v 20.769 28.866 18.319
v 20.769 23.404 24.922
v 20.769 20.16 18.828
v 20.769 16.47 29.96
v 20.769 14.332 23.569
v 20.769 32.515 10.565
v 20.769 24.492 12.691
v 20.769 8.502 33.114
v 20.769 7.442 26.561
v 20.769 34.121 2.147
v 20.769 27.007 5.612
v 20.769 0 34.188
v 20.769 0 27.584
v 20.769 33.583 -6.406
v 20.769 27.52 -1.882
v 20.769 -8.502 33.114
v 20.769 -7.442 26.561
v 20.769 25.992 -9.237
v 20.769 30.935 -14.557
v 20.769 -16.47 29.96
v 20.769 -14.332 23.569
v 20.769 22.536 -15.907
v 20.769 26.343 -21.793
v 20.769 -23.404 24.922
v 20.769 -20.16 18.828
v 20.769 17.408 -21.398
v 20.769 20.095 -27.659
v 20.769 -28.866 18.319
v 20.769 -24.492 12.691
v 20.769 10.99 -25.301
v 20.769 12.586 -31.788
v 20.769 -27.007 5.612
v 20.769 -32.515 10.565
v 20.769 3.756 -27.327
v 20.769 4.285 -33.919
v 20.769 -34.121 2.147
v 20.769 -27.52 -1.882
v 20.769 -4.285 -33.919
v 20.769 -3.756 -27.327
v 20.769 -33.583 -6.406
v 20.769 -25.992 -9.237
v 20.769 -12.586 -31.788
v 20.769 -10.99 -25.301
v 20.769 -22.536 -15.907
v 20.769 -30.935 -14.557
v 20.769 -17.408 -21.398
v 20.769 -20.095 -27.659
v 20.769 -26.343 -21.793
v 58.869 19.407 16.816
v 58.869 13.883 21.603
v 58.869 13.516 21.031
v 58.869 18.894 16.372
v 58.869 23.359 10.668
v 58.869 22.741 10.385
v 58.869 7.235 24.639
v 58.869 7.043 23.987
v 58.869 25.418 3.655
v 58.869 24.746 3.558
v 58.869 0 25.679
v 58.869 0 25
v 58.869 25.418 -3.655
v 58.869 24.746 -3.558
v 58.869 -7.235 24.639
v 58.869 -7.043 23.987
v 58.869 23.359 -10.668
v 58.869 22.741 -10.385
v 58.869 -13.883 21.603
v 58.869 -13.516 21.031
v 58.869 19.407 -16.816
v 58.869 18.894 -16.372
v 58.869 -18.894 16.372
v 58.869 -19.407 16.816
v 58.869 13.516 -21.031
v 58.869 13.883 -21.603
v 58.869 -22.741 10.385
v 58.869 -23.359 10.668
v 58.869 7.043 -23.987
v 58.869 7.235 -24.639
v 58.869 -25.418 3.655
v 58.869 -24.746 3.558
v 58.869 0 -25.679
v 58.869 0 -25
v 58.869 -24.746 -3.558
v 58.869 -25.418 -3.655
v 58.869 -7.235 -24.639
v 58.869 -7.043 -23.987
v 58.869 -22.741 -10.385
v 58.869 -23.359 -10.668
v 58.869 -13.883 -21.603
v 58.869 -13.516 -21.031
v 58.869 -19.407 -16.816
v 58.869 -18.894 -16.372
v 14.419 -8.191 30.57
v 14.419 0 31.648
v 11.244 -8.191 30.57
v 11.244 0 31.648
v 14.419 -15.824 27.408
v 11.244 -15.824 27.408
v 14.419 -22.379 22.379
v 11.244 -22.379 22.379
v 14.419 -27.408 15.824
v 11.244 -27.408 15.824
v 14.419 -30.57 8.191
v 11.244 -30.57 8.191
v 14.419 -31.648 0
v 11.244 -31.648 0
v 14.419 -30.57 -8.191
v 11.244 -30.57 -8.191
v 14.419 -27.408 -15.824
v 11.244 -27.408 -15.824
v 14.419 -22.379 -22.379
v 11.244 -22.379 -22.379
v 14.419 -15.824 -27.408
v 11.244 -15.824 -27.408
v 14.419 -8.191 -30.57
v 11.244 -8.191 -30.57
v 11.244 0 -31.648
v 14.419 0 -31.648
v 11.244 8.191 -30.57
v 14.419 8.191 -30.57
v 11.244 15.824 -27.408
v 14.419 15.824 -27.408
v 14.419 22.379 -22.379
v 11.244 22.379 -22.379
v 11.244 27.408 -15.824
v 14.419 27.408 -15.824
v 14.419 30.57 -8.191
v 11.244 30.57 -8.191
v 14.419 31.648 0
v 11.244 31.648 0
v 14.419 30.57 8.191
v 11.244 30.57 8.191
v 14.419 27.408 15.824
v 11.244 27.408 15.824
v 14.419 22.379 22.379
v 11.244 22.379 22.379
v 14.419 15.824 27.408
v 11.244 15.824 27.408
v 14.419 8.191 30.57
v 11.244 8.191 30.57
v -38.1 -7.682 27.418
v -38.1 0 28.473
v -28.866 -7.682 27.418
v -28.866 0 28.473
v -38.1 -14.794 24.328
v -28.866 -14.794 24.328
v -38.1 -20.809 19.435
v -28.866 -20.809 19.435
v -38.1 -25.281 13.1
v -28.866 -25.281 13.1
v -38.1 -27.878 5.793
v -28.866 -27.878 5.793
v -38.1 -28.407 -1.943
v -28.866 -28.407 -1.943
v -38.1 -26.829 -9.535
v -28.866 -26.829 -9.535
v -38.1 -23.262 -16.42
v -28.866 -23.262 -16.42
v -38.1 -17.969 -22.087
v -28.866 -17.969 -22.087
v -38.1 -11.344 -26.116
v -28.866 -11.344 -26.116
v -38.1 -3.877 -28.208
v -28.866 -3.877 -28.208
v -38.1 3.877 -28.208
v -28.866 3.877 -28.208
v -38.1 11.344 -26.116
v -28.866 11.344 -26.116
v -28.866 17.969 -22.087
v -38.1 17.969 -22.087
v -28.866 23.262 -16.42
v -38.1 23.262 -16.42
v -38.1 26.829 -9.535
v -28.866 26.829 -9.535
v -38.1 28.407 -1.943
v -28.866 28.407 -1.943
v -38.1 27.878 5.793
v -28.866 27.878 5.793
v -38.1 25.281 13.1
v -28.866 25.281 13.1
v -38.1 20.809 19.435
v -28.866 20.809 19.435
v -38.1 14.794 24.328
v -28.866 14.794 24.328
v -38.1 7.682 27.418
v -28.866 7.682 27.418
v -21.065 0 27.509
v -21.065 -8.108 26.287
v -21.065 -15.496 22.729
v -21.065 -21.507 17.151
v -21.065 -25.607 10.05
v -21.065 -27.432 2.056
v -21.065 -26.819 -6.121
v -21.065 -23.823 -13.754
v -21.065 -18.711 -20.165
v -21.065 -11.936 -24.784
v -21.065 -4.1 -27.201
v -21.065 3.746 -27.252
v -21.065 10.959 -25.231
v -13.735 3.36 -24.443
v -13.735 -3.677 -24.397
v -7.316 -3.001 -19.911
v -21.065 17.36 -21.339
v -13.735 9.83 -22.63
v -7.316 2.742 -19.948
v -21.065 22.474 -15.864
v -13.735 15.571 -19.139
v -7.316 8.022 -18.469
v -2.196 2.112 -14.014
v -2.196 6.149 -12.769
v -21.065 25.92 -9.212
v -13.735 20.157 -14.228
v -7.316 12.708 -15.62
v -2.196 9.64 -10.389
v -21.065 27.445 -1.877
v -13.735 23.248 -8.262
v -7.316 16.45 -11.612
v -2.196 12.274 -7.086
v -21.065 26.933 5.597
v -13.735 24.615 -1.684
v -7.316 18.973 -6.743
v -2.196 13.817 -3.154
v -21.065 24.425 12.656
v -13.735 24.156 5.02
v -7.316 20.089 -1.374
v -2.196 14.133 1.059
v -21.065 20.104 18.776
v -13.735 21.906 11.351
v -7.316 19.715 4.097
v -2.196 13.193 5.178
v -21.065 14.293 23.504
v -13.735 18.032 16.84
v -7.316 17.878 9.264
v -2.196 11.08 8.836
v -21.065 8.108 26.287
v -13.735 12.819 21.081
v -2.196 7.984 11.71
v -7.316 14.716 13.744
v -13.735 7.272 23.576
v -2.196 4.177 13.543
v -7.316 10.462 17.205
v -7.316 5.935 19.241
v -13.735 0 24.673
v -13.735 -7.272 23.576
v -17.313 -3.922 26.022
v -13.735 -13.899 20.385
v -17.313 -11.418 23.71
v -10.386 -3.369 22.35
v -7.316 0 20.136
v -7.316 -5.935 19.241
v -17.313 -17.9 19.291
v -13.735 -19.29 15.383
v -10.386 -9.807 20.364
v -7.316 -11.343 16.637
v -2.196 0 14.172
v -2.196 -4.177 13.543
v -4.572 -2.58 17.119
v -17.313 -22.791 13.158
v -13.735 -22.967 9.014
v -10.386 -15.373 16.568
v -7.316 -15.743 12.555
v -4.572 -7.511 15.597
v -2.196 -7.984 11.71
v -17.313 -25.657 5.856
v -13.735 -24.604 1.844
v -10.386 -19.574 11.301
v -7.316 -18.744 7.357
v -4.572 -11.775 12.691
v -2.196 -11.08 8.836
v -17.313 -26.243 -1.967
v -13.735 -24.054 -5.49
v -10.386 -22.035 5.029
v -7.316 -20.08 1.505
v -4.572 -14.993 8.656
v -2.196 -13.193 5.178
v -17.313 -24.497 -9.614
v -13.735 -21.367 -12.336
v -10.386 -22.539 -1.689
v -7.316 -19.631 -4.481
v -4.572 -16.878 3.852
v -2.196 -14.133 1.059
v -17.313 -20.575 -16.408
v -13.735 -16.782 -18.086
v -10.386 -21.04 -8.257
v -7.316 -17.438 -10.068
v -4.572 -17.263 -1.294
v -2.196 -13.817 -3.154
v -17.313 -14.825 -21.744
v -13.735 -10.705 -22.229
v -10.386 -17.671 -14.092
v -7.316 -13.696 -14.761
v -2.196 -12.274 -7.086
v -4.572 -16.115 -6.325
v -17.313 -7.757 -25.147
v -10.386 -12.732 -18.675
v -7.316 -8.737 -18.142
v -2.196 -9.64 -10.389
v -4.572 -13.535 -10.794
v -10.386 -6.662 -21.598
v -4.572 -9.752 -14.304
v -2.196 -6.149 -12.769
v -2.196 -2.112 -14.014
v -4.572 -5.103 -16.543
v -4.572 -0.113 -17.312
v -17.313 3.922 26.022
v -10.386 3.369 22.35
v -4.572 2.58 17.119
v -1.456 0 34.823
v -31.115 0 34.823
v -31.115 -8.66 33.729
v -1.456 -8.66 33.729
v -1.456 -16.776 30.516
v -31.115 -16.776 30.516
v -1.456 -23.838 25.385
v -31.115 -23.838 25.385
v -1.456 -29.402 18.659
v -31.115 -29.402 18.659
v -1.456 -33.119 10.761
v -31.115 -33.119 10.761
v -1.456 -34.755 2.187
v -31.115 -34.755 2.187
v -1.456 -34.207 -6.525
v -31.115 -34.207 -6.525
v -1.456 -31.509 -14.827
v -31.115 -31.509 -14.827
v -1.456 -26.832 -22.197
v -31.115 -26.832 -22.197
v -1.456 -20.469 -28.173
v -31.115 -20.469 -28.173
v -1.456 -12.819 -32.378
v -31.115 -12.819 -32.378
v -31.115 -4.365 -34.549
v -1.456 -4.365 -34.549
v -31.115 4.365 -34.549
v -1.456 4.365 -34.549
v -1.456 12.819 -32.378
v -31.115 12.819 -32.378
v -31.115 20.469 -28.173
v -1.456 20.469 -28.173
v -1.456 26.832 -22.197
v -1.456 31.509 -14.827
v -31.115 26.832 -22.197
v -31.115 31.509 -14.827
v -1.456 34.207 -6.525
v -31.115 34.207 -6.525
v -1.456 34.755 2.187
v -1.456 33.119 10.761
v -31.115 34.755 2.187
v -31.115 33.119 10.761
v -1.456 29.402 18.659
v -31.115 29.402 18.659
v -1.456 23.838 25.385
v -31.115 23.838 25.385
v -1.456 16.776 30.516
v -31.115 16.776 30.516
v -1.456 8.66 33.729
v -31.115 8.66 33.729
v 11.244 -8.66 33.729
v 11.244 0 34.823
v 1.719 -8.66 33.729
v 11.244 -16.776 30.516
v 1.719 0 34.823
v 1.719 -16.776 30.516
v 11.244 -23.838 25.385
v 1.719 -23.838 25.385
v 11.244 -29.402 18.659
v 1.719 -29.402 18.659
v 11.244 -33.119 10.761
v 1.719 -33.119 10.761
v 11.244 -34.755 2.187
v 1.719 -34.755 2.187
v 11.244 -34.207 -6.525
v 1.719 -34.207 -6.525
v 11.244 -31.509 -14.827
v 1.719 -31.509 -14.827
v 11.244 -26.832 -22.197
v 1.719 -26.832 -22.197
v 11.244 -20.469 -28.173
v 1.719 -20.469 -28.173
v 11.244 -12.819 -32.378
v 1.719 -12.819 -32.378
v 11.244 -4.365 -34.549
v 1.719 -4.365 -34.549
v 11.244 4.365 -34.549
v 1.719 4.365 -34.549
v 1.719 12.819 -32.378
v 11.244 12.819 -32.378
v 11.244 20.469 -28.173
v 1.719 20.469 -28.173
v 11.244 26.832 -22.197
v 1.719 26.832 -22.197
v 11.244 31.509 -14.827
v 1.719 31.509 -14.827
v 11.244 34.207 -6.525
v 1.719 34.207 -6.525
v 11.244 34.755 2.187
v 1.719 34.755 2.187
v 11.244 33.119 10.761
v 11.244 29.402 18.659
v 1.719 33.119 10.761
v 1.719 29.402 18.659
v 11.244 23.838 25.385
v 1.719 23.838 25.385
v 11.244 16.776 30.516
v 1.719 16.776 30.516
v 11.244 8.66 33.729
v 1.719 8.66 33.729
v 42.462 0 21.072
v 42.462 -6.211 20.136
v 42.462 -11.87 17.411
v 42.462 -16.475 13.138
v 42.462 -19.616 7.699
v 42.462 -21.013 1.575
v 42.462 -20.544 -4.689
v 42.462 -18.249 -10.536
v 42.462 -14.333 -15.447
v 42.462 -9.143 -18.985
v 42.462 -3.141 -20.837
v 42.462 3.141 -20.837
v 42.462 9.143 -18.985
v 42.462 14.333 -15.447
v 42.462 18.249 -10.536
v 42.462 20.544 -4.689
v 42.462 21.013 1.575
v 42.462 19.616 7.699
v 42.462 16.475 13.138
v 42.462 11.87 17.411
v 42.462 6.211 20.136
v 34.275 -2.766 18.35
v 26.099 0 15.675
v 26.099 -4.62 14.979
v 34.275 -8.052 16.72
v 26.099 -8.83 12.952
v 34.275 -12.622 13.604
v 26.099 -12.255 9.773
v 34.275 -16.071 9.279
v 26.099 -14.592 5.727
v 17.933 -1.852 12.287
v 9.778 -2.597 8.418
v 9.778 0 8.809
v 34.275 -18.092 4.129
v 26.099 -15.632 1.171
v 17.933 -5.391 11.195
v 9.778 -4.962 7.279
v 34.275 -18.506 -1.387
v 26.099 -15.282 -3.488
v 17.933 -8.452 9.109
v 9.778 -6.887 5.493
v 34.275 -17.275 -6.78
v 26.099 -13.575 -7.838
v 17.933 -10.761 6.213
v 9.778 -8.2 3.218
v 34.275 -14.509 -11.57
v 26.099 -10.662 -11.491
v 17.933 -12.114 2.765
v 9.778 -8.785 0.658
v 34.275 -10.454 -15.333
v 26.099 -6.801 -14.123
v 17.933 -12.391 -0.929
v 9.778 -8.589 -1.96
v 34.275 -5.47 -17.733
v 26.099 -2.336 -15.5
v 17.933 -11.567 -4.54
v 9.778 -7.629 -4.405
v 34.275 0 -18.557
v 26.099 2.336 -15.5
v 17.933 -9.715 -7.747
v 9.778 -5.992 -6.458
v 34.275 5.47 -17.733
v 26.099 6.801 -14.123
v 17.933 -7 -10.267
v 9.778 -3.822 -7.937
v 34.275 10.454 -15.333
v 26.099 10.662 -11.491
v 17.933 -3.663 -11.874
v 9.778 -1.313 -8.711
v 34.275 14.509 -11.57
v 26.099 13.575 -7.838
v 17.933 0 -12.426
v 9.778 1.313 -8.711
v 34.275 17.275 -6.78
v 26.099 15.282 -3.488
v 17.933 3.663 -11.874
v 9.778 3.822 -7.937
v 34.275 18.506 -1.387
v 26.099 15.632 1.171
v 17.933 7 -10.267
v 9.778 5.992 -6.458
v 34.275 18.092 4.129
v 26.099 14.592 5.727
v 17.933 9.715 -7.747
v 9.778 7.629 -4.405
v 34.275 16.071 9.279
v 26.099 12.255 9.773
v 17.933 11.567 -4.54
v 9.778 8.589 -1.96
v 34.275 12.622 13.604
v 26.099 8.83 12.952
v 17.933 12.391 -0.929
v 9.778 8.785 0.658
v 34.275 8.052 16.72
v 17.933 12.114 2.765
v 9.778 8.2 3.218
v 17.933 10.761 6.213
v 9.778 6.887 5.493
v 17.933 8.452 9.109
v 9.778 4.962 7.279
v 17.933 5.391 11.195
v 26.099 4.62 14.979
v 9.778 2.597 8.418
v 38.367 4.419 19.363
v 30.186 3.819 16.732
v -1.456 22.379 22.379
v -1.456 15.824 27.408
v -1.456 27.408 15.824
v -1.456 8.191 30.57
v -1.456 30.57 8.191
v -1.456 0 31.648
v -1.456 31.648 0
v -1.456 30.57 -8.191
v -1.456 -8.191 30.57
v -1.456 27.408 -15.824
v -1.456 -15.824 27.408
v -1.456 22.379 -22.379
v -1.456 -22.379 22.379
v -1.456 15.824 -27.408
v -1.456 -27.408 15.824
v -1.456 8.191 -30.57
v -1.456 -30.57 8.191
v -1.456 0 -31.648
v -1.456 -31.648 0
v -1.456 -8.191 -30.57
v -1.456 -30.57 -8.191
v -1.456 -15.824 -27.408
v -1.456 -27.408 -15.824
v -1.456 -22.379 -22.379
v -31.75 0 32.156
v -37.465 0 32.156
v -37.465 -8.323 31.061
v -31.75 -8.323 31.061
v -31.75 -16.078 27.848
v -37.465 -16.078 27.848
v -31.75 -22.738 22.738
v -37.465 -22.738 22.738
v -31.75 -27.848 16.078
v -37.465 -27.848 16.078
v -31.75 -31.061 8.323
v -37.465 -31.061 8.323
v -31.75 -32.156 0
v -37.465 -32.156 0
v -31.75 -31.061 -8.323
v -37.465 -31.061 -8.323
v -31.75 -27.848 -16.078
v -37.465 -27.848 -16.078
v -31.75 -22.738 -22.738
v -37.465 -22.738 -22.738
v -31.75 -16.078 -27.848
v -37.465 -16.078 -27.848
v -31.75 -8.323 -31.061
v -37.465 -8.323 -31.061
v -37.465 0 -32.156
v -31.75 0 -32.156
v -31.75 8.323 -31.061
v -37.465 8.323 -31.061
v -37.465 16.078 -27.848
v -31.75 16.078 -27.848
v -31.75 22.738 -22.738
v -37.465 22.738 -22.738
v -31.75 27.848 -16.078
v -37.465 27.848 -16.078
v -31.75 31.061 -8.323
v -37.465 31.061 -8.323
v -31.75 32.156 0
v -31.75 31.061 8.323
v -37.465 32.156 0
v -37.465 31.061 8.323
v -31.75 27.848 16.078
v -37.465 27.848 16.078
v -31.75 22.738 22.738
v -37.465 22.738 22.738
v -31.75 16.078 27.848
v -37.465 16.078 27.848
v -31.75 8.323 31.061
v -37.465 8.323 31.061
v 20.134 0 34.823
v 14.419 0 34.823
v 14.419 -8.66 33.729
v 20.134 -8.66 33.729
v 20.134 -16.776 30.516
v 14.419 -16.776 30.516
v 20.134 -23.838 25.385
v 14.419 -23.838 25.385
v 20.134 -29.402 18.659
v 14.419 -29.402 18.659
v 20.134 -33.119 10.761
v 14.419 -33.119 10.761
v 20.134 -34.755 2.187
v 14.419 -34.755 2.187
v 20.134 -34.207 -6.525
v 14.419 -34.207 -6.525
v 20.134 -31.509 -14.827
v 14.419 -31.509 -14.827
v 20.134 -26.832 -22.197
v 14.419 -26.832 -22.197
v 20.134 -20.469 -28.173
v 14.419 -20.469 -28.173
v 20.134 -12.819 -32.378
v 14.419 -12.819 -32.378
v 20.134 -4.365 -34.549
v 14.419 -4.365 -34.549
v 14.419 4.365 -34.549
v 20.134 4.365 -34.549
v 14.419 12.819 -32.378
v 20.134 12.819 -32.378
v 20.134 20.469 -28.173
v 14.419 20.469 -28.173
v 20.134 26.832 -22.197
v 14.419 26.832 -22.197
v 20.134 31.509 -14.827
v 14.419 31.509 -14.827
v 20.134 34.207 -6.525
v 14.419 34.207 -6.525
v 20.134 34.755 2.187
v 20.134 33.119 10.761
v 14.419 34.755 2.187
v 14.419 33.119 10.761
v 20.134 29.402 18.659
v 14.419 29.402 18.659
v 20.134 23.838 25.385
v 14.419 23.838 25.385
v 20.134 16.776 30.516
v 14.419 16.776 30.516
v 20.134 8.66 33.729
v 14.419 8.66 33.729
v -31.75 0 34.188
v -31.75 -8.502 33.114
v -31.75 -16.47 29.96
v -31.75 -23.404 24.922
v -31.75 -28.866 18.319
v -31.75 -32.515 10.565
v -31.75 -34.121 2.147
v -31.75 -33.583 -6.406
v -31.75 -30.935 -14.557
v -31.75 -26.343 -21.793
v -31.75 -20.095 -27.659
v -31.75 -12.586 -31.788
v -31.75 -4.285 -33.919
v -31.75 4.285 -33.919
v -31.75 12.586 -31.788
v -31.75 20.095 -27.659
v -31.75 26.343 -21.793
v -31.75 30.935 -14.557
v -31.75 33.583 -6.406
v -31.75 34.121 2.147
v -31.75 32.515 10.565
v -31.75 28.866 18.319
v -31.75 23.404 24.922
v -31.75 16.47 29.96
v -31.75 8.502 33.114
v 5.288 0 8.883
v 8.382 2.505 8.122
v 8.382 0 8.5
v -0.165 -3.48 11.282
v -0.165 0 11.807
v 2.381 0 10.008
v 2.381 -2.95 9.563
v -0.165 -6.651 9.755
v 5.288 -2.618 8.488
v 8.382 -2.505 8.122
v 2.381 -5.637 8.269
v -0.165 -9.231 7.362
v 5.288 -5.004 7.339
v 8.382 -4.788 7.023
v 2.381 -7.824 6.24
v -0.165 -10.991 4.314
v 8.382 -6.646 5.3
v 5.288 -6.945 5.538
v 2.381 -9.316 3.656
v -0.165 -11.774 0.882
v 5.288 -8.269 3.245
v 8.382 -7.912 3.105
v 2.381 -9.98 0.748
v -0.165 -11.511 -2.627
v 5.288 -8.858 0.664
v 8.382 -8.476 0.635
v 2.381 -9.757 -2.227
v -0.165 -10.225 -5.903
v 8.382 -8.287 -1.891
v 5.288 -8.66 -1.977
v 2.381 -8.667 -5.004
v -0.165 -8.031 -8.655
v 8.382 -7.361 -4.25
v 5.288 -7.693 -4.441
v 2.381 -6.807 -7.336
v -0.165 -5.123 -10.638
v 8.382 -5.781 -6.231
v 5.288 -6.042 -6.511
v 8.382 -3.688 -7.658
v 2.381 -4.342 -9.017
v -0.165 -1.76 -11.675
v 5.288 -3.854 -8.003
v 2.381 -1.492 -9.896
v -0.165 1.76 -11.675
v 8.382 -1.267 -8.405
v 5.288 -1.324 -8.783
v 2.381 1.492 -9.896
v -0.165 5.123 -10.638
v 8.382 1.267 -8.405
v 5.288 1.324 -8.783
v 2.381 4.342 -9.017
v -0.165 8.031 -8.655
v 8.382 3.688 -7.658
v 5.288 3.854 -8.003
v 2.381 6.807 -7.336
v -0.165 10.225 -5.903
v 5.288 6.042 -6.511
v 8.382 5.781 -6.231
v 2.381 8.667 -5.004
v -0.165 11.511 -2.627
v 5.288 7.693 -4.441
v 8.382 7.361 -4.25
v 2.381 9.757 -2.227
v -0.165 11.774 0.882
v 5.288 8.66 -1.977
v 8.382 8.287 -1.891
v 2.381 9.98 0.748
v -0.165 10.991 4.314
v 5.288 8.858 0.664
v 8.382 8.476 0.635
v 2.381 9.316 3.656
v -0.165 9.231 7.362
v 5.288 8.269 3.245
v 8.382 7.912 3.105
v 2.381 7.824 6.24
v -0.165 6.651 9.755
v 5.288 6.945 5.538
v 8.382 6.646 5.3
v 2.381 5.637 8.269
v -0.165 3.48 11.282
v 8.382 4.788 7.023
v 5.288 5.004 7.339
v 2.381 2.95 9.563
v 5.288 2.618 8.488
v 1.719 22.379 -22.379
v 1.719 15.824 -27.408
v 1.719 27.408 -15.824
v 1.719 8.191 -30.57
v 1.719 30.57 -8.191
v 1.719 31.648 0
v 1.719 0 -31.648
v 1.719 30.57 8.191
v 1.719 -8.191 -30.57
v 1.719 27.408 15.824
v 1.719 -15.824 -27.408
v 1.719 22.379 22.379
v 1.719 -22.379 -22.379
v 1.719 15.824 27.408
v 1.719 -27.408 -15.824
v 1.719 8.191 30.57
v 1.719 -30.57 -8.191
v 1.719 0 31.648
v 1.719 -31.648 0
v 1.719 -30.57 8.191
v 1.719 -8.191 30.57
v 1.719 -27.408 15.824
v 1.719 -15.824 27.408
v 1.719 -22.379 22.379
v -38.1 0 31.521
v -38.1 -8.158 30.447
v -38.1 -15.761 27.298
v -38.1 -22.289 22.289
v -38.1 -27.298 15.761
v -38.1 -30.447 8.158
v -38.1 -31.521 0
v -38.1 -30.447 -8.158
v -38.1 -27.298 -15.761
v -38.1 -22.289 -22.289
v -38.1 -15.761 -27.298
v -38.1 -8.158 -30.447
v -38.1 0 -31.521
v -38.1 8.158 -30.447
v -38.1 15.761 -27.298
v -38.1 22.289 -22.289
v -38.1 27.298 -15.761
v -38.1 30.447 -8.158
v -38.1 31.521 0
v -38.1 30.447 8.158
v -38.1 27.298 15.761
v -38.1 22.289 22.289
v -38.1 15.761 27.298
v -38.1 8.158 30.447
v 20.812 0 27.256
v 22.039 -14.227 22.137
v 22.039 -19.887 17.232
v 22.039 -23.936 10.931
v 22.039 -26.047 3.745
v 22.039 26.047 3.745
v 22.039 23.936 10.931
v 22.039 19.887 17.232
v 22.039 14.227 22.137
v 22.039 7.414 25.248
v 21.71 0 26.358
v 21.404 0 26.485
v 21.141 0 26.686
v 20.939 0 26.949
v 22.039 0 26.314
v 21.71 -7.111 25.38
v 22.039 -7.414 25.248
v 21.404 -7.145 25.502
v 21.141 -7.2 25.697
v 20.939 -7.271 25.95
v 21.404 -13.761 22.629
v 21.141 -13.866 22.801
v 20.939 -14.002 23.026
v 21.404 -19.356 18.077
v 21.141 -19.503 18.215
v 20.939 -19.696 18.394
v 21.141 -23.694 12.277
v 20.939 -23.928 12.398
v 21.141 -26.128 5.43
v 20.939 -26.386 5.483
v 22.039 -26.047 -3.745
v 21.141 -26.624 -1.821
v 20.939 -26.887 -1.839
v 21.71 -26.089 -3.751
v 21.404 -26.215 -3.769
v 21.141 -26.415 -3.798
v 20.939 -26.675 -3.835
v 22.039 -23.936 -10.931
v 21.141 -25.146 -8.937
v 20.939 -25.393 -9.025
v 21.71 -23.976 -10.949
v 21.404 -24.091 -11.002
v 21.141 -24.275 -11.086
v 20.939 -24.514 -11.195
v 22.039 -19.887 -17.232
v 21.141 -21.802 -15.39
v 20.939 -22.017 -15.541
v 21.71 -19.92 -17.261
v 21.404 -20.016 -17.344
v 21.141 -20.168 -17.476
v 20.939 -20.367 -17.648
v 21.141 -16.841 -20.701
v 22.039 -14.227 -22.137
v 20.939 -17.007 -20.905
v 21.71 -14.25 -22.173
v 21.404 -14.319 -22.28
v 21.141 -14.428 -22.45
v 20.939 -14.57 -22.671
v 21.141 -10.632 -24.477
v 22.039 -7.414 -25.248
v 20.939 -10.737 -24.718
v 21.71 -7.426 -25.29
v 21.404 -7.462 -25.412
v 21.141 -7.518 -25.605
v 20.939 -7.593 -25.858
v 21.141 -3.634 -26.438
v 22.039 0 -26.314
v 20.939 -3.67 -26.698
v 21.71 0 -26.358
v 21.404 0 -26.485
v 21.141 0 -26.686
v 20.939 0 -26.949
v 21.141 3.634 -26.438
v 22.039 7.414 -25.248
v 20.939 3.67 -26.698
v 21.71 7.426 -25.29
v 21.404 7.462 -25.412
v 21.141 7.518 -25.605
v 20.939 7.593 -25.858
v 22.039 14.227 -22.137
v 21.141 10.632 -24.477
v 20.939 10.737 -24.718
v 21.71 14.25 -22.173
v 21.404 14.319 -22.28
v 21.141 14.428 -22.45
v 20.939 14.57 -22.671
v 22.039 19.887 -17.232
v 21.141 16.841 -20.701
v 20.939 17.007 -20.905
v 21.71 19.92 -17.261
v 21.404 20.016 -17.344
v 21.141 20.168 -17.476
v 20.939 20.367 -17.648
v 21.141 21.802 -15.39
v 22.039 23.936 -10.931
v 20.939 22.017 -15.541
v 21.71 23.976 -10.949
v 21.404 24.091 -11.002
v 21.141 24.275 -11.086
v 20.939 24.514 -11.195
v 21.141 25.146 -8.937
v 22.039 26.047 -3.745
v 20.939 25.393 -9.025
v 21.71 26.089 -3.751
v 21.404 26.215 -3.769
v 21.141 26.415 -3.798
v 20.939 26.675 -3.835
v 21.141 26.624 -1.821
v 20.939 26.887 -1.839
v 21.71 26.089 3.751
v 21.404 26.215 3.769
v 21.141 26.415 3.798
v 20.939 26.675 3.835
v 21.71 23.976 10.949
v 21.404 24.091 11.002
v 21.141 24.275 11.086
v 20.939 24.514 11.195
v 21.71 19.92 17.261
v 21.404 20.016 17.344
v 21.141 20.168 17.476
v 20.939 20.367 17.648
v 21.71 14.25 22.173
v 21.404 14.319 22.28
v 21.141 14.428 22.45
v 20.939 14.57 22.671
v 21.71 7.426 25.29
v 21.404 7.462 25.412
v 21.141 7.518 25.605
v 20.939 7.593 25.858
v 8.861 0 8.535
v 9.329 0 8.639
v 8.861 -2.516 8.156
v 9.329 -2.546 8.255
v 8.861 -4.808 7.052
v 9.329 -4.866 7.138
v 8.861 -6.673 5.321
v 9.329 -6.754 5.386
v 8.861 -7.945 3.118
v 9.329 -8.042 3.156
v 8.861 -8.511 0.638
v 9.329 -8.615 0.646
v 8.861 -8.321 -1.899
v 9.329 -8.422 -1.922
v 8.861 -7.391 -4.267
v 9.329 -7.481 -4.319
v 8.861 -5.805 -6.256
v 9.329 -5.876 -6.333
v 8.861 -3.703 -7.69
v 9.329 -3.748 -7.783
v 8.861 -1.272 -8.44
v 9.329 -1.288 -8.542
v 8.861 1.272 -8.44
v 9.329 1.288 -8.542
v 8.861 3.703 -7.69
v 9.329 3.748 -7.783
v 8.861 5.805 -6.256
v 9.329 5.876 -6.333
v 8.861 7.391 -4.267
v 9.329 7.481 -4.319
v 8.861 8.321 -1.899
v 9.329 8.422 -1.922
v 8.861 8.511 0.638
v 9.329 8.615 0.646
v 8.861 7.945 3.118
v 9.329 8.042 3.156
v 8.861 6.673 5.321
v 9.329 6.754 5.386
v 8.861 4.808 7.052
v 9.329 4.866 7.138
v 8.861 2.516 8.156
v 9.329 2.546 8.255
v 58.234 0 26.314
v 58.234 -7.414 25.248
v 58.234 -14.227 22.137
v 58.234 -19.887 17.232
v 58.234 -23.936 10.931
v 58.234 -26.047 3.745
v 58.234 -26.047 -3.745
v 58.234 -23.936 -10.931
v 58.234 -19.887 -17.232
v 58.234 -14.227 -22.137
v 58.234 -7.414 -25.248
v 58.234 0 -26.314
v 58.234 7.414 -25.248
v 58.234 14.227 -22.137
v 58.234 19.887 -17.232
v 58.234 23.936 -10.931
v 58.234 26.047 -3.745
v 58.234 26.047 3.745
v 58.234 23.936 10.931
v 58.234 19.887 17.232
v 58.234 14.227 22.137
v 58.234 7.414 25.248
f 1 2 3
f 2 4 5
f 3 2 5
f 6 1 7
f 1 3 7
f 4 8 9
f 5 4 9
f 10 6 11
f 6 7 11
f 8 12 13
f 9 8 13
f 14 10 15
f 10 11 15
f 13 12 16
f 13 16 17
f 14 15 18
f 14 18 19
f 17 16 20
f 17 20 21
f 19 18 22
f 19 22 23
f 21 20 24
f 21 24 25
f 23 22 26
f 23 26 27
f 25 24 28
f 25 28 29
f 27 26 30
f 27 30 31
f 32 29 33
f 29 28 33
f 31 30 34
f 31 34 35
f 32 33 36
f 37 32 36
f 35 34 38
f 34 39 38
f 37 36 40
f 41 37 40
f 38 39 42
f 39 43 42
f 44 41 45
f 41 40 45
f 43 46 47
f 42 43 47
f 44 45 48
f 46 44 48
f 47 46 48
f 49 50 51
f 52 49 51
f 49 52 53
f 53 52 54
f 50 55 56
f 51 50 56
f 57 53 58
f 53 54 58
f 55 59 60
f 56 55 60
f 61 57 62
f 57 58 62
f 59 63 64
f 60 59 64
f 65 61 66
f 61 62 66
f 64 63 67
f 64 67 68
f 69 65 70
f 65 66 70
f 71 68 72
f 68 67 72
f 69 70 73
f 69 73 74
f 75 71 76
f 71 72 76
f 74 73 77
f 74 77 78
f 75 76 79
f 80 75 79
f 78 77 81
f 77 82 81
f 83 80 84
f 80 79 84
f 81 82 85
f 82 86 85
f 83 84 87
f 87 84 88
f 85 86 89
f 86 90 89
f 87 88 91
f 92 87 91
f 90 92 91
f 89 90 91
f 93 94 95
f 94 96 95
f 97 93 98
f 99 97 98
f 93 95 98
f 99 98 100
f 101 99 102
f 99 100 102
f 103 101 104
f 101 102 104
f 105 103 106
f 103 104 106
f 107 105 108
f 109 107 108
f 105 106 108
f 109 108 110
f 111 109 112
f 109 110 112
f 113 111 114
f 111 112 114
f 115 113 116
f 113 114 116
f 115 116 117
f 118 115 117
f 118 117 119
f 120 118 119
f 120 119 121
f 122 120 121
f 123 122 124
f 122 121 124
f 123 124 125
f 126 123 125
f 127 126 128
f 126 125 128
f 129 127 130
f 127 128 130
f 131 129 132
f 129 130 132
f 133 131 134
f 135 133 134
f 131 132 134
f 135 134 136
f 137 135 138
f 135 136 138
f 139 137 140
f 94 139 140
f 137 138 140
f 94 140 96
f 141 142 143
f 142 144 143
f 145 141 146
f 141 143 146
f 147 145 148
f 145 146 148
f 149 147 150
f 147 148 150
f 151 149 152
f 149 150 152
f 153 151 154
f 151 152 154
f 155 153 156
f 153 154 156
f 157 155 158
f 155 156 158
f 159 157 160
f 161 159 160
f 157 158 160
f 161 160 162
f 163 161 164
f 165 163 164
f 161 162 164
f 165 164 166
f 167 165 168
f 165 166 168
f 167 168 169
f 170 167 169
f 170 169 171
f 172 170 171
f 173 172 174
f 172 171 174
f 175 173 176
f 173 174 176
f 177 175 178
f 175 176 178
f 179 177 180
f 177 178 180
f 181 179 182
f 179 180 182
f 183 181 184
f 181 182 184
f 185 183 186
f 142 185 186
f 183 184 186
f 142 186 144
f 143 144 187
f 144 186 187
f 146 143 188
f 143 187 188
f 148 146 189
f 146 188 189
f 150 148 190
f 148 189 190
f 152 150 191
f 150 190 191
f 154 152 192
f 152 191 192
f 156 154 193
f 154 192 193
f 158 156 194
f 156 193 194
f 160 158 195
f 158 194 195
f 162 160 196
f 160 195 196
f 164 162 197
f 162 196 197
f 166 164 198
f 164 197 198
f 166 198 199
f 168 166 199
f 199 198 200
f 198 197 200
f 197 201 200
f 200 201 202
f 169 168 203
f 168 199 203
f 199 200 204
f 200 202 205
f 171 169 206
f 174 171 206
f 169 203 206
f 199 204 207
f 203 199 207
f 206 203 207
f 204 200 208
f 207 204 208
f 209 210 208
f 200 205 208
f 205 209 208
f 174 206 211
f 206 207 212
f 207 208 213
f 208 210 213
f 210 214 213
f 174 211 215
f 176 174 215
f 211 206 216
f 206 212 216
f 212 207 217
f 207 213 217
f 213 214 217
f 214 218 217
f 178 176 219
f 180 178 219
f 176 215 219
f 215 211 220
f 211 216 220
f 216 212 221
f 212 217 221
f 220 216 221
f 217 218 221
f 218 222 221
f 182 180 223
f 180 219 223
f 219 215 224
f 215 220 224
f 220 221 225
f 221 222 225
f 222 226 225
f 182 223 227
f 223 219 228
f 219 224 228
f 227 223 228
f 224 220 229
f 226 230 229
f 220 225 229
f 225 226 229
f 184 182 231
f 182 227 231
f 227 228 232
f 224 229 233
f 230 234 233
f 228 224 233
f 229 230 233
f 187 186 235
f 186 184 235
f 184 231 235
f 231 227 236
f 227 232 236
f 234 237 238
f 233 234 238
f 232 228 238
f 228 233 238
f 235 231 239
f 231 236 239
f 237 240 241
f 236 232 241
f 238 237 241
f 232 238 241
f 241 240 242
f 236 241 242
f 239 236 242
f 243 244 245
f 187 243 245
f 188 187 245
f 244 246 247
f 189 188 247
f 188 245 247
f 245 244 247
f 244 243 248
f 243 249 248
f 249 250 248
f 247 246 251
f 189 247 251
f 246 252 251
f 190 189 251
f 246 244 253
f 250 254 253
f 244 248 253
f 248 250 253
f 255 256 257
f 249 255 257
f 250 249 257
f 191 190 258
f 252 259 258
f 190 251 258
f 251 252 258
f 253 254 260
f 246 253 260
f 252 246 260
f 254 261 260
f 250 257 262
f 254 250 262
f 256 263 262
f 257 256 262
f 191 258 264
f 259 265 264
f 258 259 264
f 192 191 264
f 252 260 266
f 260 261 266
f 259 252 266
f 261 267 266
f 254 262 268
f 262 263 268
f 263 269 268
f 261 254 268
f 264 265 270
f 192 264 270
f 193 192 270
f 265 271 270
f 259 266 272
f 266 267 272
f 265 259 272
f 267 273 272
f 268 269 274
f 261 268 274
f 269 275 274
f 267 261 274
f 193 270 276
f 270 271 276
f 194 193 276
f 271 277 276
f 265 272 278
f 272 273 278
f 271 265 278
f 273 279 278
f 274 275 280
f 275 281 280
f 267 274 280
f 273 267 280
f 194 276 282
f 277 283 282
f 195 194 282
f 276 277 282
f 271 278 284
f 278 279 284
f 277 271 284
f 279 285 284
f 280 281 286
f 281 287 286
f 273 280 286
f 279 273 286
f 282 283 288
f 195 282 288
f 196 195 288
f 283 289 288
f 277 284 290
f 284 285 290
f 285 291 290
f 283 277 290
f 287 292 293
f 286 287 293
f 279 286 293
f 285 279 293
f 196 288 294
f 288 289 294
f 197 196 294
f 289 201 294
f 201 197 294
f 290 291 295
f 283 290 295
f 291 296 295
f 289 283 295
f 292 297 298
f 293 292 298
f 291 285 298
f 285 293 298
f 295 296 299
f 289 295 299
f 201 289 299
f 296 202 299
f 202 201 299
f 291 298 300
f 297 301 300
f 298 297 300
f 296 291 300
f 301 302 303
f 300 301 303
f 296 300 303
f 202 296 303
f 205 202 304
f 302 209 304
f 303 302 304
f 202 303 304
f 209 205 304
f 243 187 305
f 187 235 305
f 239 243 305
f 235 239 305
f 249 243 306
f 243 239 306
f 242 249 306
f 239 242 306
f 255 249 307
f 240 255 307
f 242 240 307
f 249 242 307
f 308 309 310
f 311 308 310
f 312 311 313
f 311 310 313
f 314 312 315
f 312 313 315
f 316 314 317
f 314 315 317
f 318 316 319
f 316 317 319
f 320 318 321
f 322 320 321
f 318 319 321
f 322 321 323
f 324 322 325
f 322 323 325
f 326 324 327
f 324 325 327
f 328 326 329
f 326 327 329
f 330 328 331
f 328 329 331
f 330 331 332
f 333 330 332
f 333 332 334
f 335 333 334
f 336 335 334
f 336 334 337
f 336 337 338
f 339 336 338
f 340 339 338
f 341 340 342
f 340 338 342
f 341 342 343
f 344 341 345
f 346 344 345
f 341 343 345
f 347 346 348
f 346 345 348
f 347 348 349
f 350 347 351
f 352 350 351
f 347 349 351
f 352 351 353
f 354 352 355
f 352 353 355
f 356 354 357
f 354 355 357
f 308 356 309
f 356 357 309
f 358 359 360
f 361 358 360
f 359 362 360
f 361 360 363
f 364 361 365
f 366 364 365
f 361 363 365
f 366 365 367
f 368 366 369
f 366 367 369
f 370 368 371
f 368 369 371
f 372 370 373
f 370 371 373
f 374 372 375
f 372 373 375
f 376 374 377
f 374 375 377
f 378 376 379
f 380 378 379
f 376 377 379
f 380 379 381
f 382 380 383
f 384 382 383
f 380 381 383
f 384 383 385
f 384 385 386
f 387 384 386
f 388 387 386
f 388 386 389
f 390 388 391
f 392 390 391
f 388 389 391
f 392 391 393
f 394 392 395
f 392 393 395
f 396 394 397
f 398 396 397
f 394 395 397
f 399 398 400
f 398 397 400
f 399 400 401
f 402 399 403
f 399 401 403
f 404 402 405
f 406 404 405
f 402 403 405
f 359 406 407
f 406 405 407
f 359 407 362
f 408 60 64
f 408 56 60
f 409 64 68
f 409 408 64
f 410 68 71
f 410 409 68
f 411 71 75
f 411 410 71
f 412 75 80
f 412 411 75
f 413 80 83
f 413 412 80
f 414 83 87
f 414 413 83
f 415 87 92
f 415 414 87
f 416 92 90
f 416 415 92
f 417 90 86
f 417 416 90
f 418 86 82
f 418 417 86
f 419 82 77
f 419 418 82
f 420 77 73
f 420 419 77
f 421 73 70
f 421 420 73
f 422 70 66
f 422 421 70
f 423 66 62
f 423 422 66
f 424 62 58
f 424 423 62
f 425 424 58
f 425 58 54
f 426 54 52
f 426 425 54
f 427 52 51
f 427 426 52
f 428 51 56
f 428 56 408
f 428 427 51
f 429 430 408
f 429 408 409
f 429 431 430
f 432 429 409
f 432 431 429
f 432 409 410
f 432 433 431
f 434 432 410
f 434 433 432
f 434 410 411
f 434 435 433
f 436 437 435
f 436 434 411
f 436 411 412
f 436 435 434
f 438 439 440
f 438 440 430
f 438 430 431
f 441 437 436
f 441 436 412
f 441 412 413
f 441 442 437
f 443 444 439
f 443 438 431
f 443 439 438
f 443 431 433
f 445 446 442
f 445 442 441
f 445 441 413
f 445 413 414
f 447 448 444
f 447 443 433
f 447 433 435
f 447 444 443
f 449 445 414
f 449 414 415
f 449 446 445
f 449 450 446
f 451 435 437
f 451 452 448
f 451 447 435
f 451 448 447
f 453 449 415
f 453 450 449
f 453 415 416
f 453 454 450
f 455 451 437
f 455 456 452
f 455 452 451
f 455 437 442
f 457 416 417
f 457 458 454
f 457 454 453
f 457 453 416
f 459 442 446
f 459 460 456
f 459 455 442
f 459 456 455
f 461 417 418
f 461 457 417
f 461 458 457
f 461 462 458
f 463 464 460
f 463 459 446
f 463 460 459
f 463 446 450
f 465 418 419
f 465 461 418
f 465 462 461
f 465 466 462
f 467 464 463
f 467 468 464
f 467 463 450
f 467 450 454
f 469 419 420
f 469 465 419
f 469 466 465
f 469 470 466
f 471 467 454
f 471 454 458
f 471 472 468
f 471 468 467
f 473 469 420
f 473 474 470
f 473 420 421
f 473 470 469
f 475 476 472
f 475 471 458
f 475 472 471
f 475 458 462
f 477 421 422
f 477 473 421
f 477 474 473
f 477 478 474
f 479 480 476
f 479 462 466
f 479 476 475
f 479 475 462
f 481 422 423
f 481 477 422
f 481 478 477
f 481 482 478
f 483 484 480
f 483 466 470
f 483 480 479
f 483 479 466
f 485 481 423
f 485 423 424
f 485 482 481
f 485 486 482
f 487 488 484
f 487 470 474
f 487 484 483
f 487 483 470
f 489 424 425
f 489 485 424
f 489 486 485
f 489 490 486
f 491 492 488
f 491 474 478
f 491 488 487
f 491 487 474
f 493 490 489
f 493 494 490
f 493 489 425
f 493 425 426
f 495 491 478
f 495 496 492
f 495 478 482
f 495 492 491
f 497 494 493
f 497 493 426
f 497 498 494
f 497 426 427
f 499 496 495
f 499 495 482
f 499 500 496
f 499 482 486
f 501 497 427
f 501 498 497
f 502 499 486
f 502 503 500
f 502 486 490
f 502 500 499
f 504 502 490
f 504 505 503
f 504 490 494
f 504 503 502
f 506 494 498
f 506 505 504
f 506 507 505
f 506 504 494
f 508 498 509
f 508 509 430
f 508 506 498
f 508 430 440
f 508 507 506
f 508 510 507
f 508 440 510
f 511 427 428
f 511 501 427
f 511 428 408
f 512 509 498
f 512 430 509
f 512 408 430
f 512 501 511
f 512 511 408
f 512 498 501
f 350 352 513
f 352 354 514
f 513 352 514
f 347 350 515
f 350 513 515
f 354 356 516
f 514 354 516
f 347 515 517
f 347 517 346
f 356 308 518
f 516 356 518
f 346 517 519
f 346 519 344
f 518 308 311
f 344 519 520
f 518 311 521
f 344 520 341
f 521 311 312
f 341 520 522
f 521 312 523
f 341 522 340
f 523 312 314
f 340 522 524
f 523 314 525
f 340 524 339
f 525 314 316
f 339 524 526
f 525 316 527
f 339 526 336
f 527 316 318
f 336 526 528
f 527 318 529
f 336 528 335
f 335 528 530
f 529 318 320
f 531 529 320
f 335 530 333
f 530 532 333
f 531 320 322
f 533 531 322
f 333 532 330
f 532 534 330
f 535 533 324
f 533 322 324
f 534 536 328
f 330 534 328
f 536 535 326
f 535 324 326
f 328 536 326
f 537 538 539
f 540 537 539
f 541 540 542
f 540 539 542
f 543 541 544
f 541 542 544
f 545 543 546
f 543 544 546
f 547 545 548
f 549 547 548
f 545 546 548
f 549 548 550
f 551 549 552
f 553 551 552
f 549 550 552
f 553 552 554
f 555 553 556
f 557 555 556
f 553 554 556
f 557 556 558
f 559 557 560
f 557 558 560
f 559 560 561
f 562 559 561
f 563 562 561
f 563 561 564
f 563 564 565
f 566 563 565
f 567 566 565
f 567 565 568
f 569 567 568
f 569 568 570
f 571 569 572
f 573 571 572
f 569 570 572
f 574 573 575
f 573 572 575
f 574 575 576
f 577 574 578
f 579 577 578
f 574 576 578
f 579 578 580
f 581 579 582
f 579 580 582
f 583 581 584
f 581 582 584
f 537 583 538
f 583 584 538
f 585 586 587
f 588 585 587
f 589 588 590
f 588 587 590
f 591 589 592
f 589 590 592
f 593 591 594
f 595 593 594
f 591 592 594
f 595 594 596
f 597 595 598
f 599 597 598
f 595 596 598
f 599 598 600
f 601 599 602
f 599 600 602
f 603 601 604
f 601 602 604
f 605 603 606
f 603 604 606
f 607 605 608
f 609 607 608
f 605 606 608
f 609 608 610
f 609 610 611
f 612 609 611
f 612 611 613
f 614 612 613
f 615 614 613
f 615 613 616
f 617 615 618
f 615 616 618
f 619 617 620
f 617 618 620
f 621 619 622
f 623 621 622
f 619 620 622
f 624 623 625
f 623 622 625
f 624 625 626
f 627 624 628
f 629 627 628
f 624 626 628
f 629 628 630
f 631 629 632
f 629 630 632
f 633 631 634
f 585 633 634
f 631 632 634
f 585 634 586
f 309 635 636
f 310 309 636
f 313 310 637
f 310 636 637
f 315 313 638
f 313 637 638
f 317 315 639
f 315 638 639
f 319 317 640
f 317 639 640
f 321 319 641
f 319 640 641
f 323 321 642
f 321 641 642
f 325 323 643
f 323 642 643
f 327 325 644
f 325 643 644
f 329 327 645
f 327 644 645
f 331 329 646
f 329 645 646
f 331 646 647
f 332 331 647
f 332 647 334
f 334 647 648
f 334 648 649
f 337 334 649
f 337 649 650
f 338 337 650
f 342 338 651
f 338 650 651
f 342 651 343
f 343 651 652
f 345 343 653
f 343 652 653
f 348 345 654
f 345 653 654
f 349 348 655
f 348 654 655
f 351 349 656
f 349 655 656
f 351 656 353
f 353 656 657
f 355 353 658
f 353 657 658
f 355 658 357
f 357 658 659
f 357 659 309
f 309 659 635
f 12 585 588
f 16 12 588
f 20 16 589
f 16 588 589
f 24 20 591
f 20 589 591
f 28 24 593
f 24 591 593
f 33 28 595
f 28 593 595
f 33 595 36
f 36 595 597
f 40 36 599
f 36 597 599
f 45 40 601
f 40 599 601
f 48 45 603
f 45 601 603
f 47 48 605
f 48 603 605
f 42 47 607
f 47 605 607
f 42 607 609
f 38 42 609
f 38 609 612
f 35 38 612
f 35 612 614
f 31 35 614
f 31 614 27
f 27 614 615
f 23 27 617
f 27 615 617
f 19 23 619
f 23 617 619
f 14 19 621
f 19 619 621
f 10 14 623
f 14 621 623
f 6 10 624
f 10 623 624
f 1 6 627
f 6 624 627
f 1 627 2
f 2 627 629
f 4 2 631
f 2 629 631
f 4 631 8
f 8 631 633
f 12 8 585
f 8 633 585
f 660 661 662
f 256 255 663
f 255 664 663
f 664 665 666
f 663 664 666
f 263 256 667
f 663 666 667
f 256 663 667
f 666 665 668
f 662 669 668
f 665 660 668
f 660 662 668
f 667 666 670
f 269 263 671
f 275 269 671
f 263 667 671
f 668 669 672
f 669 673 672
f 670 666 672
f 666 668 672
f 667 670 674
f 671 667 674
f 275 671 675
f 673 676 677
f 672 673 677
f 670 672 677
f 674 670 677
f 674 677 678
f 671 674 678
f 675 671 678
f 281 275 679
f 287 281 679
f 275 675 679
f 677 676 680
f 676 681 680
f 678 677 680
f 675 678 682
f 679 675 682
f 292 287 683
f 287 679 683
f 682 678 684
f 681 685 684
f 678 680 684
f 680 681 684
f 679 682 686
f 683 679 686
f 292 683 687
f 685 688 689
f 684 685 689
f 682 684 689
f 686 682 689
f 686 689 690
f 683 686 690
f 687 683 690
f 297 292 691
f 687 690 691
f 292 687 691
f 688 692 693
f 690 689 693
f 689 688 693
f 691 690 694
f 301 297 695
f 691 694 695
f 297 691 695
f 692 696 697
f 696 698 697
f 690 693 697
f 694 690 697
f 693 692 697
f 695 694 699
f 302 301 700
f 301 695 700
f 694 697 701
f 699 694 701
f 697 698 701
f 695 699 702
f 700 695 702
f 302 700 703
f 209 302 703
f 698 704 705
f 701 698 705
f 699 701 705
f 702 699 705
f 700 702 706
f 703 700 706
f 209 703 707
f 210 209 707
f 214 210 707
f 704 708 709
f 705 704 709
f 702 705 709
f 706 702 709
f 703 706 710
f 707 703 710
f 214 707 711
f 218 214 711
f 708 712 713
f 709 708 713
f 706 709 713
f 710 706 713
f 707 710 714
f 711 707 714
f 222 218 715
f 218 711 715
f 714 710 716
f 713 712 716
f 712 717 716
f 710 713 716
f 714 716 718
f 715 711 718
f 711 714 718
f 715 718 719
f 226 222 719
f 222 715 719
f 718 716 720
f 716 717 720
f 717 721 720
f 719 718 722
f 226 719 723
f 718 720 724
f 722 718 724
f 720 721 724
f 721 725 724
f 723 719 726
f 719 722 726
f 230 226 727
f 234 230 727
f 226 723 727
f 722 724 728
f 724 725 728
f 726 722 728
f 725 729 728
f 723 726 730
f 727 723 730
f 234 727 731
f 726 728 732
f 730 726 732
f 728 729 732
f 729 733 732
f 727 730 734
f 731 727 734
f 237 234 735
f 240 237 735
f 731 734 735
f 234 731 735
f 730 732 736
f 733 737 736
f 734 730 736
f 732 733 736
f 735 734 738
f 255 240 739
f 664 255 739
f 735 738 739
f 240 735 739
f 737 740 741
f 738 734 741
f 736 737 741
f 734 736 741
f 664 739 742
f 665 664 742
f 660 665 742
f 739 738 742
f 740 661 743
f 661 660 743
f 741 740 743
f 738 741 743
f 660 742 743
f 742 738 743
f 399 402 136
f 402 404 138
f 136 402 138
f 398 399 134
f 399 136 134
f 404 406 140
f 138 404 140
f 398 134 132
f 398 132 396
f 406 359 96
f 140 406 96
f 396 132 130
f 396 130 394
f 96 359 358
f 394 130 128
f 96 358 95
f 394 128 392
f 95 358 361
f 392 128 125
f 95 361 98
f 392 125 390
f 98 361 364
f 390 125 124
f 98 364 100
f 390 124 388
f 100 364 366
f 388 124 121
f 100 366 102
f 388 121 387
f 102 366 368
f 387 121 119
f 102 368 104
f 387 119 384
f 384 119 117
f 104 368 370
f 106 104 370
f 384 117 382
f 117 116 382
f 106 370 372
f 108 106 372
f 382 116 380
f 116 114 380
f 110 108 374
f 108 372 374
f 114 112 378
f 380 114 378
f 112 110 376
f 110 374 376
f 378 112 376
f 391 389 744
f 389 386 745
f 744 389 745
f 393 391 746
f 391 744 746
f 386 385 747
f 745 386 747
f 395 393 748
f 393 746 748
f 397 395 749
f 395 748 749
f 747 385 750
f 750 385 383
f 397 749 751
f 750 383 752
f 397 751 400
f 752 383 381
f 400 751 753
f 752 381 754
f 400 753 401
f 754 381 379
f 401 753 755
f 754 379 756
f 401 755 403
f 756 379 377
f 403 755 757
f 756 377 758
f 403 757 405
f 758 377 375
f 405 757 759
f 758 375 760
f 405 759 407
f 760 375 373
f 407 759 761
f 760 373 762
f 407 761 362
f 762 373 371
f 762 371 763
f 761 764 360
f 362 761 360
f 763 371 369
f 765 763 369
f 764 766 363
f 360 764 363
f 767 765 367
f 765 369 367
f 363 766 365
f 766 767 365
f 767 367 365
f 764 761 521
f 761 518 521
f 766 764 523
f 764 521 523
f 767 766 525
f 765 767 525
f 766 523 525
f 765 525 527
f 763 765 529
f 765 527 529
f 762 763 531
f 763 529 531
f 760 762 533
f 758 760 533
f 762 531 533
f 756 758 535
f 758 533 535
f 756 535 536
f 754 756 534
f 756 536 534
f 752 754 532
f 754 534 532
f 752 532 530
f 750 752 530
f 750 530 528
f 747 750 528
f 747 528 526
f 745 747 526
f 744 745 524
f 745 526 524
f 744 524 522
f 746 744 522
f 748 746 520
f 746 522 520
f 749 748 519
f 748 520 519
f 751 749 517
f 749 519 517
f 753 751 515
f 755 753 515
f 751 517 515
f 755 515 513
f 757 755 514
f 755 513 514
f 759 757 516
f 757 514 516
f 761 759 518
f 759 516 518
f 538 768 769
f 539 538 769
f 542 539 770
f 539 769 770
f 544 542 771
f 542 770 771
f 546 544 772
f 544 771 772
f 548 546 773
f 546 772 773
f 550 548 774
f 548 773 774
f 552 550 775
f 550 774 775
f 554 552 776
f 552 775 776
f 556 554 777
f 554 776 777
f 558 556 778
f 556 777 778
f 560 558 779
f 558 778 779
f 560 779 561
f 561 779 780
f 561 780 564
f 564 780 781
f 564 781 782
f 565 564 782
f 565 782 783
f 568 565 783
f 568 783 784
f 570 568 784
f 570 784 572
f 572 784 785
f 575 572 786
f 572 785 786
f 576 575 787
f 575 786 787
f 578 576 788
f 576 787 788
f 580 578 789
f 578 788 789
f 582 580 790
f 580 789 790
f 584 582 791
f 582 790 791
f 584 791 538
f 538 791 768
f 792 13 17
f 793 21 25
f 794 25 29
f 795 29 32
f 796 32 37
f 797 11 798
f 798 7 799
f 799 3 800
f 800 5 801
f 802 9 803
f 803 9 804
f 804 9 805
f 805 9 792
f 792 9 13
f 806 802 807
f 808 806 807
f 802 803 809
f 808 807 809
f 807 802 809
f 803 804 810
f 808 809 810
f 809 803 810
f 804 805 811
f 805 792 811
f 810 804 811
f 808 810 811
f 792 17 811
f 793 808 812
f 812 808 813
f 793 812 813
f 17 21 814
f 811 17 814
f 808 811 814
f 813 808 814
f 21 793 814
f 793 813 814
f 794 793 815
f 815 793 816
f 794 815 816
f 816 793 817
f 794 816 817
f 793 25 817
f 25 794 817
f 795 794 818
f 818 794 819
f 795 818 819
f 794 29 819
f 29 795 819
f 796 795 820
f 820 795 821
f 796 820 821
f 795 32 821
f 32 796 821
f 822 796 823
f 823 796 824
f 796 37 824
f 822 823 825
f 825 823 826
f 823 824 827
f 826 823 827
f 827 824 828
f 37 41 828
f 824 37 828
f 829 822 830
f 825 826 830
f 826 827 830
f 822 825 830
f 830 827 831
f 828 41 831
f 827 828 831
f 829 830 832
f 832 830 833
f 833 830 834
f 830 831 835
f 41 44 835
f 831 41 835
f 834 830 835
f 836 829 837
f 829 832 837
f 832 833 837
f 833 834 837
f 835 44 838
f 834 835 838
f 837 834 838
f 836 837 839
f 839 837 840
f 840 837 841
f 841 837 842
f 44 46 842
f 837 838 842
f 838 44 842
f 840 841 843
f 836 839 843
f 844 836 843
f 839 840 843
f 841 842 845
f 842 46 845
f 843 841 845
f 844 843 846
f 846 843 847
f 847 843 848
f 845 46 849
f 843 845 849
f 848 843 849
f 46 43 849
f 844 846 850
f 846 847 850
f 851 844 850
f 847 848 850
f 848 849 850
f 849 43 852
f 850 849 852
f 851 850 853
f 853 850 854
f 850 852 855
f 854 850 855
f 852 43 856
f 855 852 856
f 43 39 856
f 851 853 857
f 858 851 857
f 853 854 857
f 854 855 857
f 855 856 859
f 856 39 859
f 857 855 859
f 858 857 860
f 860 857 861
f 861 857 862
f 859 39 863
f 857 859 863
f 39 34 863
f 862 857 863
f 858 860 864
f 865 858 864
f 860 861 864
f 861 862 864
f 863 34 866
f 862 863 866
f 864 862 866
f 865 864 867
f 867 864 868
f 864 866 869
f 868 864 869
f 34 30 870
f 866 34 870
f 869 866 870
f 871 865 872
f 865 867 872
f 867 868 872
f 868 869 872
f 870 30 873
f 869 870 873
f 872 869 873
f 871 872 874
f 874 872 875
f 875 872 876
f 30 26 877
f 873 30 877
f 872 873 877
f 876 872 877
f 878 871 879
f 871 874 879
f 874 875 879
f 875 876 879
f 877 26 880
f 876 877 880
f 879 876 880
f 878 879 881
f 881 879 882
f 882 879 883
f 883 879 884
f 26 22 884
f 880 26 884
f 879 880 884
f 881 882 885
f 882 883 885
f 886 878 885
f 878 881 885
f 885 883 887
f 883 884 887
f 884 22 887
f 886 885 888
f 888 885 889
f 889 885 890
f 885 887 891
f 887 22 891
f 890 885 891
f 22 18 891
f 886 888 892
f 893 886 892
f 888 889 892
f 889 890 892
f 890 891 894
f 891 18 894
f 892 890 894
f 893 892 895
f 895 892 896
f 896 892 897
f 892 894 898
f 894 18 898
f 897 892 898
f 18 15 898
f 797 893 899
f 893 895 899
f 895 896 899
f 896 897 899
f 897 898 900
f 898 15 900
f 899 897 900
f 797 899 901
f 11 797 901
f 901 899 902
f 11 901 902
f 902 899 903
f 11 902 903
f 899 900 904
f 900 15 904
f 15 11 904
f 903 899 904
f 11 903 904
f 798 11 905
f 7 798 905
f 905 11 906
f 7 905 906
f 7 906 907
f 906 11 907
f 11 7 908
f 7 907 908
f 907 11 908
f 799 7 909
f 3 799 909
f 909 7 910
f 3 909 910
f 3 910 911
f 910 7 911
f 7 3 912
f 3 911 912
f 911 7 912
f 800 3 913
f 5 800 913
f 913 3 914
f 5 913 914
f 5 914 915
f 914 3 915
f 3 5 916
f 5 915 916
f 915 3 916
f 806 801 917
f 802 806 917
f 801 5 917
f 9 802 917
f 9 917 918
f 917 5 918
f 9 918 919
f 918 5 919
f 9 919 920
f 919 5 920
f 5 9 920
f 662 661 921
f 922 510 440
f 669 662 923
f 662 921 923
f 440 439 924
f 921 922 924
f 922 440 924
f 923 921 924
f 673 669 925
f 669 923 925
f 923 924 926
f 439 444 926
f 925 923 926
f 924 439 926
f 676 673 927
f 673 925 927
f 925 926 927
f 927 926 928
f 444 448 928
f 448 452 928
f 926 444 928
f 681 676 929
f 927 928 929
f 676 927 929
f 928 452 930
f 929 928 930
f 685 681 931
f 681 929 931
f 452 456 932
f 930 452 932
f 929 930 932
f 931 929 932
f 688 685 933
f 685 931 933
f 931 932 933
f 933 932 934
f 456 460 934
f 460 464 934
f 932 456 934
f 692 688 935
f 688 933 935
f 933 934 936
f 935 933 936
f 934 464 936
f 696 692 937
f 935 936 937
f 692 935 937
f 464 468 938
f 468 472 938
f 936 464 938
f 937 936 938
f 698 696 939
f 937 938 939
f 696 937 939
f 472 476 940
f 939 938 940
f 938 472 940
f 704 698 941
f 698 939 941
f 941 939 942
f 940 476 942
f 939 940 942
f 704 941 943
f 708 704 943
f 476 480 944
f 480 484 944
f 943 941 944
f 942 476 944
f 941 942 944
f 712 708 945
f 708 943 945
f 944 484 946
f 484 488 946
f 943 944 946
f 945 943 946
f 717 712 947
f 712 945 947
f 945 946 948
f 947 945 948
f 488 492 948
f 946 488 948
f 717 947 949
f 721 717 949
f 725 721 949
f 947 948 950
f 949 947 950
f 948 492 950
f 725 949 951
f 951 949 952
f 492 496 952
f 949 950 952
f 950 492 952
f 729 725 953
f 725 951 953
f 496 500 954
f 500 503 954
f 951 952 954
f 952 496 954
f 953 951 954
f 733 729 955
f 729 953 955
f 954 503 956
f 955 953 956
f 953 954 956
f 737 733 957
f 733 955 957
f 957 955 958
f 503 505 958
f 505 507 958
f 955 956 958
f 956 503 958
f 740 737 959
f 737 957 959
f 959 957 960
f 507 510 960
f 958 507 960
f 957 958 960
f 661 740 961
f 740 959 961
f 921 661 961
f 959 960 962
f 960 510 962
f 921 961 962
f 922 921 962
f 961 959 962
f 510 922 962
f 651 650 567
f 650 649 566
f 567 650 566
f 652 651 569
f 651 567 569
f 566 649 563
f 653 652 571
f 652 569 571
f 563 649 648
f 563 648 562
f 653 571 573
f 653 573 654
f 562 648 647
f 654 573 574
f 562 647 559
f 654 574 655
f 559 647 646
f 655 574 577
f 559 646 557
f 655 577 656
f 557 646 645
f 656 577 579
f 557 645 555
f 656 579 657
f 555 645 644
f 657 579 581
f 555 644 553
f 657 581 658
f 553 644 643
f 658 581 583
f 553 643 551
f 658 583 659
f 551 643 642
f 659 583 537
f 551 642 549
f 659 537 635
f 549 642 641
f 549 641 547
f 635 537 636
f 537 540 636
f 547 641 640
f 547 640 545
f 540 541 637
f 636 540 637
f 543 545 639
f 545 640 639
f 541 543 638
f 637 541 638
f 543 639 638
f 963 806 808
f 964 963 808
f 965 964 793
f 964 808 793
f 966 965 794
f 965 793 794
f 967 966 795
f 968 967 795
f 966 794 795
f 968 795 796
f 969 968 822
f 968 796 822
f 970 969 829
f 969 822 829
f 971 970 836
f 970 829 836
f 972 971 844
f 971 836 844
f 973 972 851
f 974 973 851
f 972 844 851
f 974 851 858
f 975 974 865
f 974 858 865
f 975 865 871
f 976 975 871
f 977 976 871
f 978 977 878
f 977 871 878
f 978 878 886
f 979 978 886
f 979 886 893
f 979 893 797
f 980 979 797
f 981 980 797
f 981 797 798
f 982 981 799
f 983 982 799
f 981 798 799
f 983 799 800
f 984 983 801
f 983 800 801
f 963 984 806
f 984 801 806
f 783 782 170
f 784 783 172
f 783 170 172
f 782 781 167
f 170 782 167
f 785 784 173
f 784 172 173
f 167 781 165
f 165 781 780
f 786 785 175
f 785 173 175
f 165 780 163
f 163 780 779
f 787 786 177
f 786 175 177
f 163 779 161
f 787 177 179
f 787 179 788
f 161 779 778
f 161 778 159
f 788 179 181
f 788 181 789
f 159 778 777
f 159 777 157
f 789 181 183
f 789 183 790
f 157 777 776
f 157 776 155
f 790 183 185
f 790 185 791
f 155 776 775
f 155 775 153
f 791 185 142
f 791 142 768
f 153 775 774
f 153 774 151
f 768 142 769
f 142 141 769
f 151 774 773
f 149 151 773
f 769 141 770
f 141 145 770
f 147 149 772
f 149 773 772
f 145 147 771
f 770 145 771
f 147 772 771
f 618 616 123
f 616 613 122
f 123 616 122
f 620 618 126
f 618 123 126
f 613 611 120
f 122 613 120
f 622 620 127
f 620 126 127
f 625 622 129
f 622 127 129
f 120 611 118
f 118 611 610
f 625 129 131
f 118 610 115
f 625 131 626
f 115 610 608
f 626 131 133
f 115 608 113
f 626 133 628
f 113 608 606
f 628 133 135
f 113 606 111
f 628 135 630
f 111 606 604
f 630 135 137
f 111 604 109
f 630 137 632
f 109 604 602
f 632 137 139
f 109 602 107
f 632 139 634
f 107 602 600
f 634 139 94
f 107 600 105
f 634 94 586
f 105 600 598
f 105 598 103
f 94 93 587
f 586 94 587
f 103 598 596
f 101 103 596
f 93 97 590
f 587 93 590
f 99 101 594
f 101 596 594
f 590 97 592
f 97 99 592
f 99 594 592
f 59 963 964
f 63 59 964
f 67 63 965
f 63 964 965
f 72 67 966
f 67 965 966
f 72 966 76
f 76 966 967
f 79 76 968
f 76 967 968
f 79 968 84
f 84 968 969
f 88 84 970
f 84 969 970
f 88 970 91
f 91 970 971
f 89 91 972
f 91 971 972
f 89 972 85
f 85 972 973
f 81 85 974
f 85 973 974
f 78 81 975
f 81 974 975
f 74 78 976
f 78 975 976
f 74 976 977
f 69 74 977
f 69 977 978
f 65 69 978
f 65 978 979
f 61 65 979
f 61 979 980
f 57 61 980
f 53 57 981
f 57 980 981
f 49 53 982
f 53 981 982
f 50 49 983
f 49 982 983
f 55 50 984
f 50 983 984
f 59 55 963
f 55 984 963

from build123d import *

# Parameters (mm, degrees)
CHAMFER1_SIZE = 0.635
FILLET1_R     = 1.27


with BuildPart() as part:
    # Sketch1 → Revolve1 (revolve)
    with BuildSketch(Plane.XY, mode=Mode.PRIVATE) as revolve1_sk:
        with BuildLine():
            Line((-31.75, 32.1564), (-38.1, 32.1564))
            Line((-38.1, 32.1564), (-38.1, 28.4734))
            Line((-38.1, 28.4734), (-28.86593235, 28.4734))
            ThreePointArc((-28.86593235, 28.4734), (-13.734767948, 24.672548379), (-2.19593235, 14.172363513))
            ThreePointArc((-2.19593235, 14.172363513), (2.380831725, 10.007569893), (8.382457197, 8.5))
            ThreePointArc((8.382457197, 8.5), (9.097140802, 8.578270584), (9.777942697, 8.809371687))
            add(Edge.make_bspline(
                [(58.868578041, 25), (34.22702979, 20.210168233), (9.777942697, 8.809371687)],
                knots=[0, 0, 0, 1, 1, 1], degree=2))
            Line((58.868578041, 25), (58.868578041, 26.3144))
            Line((58.868578041, 26.3144), (20.768578041, 26.3144))
            Line((20.768578041, 26.3144), (20.768578041, 34.8234))
            Line((20.768578041, 34.8234), (14.418578041, 34.8234))
            Line((14.418578041, 34.8234), (14.418578041, 31.6484))
            Line((14.418578041, 31.6484), (11.243578041, 31.6484))
            Line((11.243578041, 31.6484), (11.243578041, 34.8234))
            Line((11.243578041, 34.8234), (1.718578041, 34.8234))
            Line((1.718578041, 34.8234), (1.718578041, 31.6484))
            Line((1.718578041, 31.6484), (-1.456421959, 31.6484))
            Line((-1.456421959, 31.6484), (-1.456421959, 34.8234))
            Line((-1.456421959, 34.8234), (-31.75, 34.8234))
            Line((-31.75, 34.8234), (-31.75, 32.1564))
        make_face()
    revolve(revolve1_sk.sketch.rotate(Axis((-88.99, 0, 0), (1, 0, 0)), 90), axis=Axis((-88.99, 0, 0), (1, 0, 0)))

    # Chamfer1
    chamfer1_edges = [part.edges().sort_by_distance(p)[0] for p in [
        (-38.1, 0, -32.1564),
        (-31.75, 0, -34.8234),
        (20.768578041, 0, -34.8234),
        (58.868578041, 0, -26.3144),
    ]]
    chamfer(chamfer1_edges, length=CHAMFER1_SIZE)

    # Fillet1
    fillet1_edges = [part.edges().sort_by_distance(p)[0] for p in [
        (20.768578041, 0, -26.3144),
    ]]
    fillet(fillet1_edges, radius=FILLET1_R)


solid = part.part
